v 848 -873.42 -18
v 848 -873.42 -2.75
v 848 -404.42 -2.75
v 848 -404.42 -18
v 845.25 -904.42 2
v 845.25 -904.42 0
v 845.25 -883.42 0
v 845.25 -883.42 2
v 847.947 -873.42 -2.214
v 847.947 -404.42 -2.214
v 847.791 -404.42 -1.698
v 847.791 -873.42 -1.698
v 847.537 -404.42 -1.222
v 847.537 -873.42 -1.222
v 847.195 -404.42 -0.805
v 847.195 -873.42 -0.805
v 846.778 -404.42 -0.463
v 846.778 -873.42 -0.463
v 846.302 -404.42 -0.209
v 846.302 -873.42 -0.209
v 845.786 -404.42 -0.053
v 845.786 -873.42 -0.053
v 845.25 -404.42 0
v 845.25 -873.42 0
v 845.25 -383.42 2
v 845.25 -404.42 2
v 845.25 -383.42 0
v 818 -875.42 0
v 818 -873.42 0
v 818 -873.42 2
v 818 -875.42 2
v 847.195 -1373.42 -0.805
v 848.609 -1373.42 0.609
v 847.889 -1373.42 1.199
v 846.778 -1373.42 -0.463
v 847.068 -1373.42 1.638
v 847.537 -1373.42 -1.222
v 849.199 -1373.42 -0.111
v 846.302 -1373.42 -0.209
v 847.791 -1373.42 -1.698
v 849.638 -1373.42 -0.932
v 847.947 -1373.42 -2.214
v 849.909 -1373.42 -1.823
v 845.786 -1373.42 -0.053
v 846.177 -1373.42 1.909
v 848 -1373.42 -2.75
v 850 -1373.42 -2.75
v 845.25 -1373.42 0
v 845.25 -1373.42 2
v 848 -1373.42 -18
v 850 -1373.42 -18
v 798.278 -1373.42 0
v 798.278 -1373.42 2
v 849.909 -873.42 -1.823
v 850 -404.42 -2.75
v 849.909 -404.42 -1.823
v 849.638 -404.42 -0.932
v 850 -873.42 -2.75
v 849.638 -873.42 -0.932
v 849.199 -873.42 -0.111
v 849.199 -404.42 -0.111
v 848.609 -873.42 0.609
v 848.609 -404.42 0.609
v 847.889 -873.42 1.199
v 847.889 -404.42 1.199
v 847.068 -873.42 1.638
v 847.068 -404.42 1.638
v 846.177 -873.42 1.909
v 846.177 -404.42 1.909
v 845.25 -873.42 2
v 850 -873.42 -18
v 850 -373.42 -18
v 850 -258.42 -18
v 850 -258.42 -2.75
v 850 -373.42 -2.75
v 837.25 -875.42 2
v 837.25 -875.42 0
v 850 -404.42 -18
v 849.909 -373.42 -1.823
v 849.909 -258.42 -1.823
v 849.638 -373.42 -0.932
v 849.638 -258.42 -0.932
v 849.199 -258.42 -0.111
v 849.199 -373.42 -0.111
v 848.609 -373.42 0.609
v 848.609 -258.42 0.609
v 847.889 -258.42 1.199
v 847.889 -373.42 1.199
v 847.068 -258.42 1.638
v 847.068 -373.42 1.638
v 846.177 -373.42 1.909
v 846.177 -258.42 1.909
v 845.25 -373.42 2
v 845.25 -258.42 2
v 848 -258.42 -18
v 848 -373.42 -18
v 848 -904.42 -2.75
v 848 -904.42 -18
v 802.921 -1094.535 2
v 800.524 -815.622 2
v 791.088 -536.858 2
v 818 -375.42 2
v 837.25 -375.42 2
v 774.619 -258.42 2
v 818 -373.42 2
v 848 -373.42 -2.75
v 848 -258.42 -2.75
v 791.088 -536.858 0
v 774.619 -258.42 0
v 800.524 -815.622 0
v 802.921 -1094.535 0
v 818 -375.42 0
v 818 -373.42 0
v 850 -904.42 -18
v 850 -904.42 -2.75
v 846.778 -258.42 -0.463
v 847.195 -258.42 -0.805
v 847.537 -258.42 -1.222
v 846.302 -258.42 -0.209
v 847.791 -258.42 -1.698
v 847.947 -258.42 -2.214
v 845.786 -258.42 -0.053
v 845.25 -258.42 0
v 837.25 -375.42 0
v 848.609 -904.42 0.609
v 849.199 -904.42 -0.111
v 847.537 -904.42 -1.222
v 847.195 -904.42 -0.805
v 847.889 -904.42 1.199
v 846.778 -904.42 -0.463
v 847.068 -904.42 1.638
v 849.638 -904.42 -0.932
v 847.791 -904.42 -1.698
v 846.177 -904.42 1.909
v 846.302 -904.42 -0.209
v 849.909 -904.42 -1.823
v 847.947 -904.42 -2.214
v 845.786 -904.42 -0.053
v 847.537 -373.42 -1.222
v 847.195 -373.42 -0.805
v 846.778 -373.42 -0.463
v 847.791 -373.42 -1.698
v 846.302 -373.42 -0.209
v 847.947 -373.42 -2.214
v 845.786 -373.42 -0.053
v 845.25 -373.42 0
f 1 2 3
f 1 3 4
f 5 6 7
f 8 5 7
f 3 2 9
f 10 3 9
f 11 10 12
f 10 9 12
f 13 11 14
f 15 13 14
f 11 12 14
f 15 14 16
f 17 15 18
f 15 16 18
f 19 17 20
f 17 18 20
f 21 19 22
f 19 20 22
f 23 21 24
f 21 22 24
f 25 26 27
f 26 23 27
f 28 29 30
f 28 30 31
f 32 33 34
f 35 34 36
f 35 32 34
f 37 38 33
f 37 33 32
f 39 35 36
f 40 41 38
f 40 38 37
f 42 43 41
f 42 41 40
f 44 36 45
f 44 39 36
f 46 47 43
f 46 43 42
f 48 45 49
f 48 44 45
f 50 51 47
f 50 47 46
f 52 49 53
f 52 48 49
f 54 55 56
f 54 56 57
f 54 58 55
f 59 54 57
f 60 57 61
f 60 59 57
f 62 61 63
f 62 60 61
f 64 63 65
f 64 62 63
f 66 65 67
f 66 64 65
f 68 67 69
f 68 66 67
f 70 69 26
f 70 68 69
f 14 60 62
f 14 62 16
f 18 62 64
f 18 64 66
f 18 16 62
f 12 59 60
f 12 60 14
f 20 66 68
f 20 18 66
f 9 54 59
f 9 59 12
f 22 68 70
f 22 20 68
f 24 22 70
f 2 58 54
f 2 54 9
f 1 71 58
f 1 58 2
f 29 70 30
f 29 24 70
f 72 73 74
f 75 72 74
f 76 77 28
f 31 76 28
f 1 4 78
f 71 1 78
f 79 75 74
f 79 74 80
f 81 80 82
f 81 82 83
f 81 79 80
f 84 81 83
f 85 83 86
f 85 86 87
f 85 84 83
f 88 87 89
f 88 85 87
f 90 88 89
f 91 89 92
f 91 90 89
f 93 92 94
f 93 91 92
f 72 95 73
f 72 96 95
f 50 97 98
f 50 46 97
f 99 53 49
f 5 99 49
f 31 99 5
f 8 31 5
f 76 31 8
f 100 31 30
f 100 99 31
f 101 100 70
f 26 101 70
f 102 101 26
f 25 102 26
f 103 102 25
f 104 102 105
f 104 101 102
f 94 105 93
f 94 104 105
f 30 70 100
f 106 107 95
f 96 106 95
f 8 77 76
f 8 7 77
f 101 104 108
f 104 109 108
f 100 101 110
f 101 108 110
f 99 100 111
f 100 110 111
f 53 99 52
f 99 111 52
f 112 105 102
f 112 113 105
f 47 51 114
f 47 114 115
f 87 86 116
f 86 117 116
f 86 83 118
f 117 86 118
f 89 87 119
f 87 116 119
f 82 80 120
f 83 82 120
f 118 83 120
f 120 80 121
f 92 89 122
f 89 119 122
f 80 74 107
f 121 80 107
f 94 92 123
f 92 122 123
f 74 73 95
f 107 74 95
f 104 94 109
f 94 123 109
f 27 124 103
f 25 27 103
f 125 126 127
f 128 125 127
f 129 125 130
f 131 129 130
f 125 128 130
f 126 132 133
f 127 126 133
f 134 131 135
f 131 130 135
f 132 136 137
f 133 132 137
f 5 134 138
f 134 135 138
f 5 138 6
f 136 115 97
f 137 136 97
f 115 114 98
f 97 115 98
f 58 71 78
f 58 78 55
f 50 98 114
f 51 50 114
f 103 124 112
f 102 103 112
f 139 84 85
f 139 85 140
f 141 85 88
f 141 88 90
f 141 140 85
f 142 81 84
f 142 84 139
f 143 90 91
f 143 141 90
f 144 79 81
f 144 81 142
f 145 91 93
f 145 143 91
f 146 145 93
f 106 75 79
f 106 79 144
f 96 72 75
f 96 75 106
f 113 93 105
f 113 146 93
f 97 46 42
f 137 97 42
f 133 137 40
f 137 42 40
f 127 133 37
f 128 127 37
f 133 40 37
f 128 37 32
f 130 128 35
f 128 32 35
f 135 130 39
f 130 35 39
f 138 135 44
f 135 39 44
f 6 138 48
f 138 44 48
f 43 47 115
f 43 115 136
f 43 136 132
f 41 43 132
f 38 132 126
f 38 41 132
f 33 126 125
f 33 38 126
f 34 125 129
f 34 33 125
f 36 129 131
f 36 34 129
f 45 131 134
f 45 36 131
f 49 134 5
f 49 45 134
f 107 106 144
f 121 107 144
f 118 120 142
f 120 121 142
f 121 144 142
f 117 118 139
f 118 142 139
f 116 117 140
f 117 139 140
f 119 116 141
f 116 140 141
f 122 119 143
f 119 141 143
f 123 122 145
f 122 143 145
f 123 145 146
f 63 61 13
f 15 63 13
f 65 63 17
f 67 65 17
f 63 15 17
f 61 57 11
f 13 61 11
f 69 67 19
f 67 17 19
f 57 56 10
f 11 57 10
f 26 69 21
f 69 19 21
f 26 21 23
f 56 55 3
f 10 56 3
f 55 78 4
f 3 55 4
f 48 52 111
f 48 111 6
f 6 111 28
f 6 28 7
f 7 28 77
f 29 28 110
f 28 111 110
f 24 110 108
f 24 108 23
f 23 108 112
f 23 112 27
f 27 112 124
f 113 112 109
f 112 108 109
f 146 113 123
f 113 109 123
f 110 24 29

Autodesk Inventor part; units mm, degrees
ref_plane "YZ Plane" through (0, 0, 0) normal (1, 0, 0) x (0, 1, 0)
ref_plane "XZ Plane" through (0, 0, 0) normal (0, 1, 0) x (-1, 0, 0)
ref_plane "XY Plane" through (0, 0, 0) normal (0, 0, 1) x (1, 0, 0)
sketch "Sketch1" plane through (0, 0, 0) normal (0, 0, 1) x (1, 0, 0)
  arc A0 (750, -2100) -> (770.156, -238.4205) centre (-10250, -1050) ccw construction
  arc A1 (752.9864, -2100.2851) -> (771.2831, -213.263) centre (-10246.9891, -1050.0292) ccw
  line L0 (-750, -2700) -> (-750, 0) construction
  line L1 (-800, 50) -> (-800, -2750) construction
  line L2 (-850, -2800) -> (-850, 100) construction
  line L3 (850, 100) -> (850, -2800)
  line L4 (800, -2750) -> (800, 50) construction
  line L5 (750, 0) -> (750, -2700) construction
  line L6 (770.156, -238.4205) -> (767.1641, -238.6409) construction
  line L7 (768.2917, -213.4901) -> (771.2831, -213.263) construction
  arc A2 (747.4657, -5.0326) -> (744.8748, -2.3426) centre (744.4792, -5.3164) ccw construction
  arc A3 (747.4657, -5.0326) -> (747.0136, -0.2851) centre (-10252.9895, -1050.2527) ccw construction
  arc A4 (767.1641, -238.6409) -> (747.4657, -5.0326) centre (-10252.9895, -1050.2527) ccw construction
  line L8 (750, 0) -> (747.0136, -0.2851) construction
  arc A5 (750.4522, -4.7486) -> (750, 0) centre (-10250, -1050) ccw construction
  arc A6 (750.4522, -4.7486) -> (745.2706, 0.6314) centre (744.4791, -5.3162) ccw
  line L9 (-750, 0) -> (750, 0) construction
  line L10 (-850, 100) -> (850, 100) construction
  line L11 (800, 50) -> (-800, 50) construction
  arc A7 (770.156, -238.4205) -> (750.4522, -4.7486) centre (-10250, -1050) ccw
  line L12 (750, -2700) -> (-750, -2700) construction
  line L13 (750, -2100) -> (752.9864, -2100.2851) construction
  line L14 (-800, -2750) -> (800, -2750)
  line L15 (850, -2800) -> (-850, -2800) construction
  arc A8 (110, -2700) -> (114.1118, -2698.3696) centre (110, -2694) ccw construction
  line L16 (0, -2697) -> (110, -2697) construction
  line L17 (0, -2700) -> (0, -2697) construction
  arc A9 (750, 0) -> (745.2706, 0.6314) centre (0, -5600) ccw construction
  line L18 (750, 0) -> (749.6018, -2.9735) construction
  arc A10 (750, -3.0268) -> (0, 47) centre (-0.2, -5603) ccw construction
  line L19 (0, 47) -> (0, 0) construction
  line L20 (0, 50) -> (0, 47) construction
  line L21 (0, 100) -> (0, 50)
  arc A11 (745.2706, 0.6314) -> (0, 50) centre (0, -5600) ccw construction
  line L22 (-750, -2100) -> (750, -2100) construction
  arc A12 (110, -2697) -> (112.0559, -2696.1848) centre (110, -2694) ccw construction
  line L23 (676.3163, -2173.4556) -> (674.2605, -2171.2708) construction
  line L24 (690.4112, -2151.9536) -> (692.4671, -2154.1384) construction
  line L25 (752.0559, -2102.1848) -> (676.3163, -2173.4556) construction
  line L26 (114.1118, -2698.3696) -> (750, -2100) construction
  arc A13 (752.0559, -2102.1848) -> (752.9864, -2100.2851) centre (749.9998, -2099.9999) ccw construction
  line L27 (750, -2100) -> (752.0559, -2102.1848) construction
  arc A14 (749.1768, -2100.7746) -> (750.1074, -2098.8746) centre (747.1209, -2098.5898) ccw construction
  line L28 (112.0559, -2696.1848) -> (690.4112, -2151.9536) construction
  line L29 (850, -258.4205) -> (774.6194, -258.4205)
  arc A15 (800, 50) -> (0, 100) centre (0, -6325) ccw construction
  arc A16 (824.6194, -258.4205) -> (800, 50) centre (-10711.2413, -1024.069) ccw construction
  line L30 (824.6194, -258.4205) -> (824.6194, 100) construction
  arc A17 (789.8132, -2131.1922) -> (824.6194, -258.4205) centre (-10201.1223, -990.2118) ccw construction
  line L31 (0, -2700) -> (0, -2750) construction
  line L32 (112.3791, -2700) -> (132.2053, -2750) construction
  line L33 (132.2053, -2750) -> (850, -2074.5565)
  arc A18 (770.0996, -238.4247) -> (766.3709, -188.564) centre (768.2917, -213.4901) ccw construction
  line L34 (850, -400) -> (783.8749, -400) construction
  line L35 (850, -900) -> (801.9923, -900) construction
  line L36 (850, -1400) -> (797.4674, -1400) construction
  line L37 (850, -1900) -> (770.2723, -1900) construction
  line L38 (350, 100) -> (350, 39.1489)
  line L39 (-1472.612, -150) -> (-973.4947, -150)
  line L40 (-1472.612, -700) -> (-973.4947, -700)
  line L41 (-1472.612, -1250) -> (-973.4947, -1250)
  line L42 (-1472.612, -1800) -> (-973.4947, -1800)
  line L43 (800, -2750) -> (850, -2750) construction
  line L44 (753.1643, -2098.4205) -> (850, -2098.4205)
  point P0 (824.6397, -2098.4205)
  dimension "d16" = 1500
  dimension "d17" = 2700
  dimension "d18" = 2100
  dimension "d19" = 6
  dimension "d20" = 3
  dimension "d21" = 3
  dimension "d22" = 6
  dimension "d23" = 3
  dimension "d24" = 239.271
  dimension "d25" = 50
  dimension "d26" = 50
  dimension "d27" = 3
  dimension "d28" = 110
  dimension "d29" = 25
  dimension "d30" = 104
  dimension "d31" = 25
  dimension "d32" = 20
  dimension "d33" = 50
  dimension "d57" = 500
  dimension "d58" = 500
  dimension "d59" = 500
  dimension "d60" = 500
  dimension "d61" = 500
  dimension "d83" = 250
  dimension "d86" = 550
  dimension "d91" = 274.5565
  dimension "d103" = 1.873
  dimension "d116" = 1840
extrude "Plate3" add sketch "Sketch1" along normal blind 2 contours A1 L29 L3 L33 L44
sketch "Sketch3" plane through (848, -258.4205, 2) normal (1, 0, 0) x (0, 1, 0)
  line L0 (-1816.136, 0) -> (0, 0)
  line L1 (0, 0) -> (0, 20)
  line L2 (0, 20) -> (-1816.136, 20)
  line L3 (-1816.136, 20) -> (-1816.136, 0)
edge flange "Flange2" height 20 angle 90 thickness 2 bend radius 2.75 thickness toward (1, 0, 0) relief tear relief width 2 relief depth 1 edges at (850, -1166.4885, 2) wall of the first edge with corners at (848, -2074.5565, 2) (848, -258.4205, 2) (848, -258.4205, -18) (848, -2074.5565, -18)
bend "Bend2"
corner "Corner2"
sketch "Sketch5" plane through (0, 0, 0) normal (0, 0, 1) x (1, 0, 0)
  line L0 (845.25, -2079.0263) -> (845.25, -258.4205) projected
  line L1 (774.6194, -258.4205) -> (845.25, -258.4205) projected
  arc A0 (753.1643, -2098.4205) -> (774.6194, -258.4205) centre (-10246.9891, -1050.0292) ccw projected
  line L2 (850, -258.4205) -> (850, -2074.5565) projected
  line L3 (850, -373.4205) -> (818, -373.4205)
  line L4 (850, -375.4205) -> (848, -375.4205) construction
  line L5 (848, -2074.5565) -> (848, -258.4205) projected
  line L6 (818, -373.4205) -> (818, -375.4205)
  line L7 (850, -873.4195) -> (801.5994, -873.4195) construction
  line L8 (850, -875.4195) -> (801.6312, -875.4195) construction
  line L9 (819, -873.4195) -> (819, -875.4195) construction
  line L10 (850, -1373.4195) -> (798.2777, -1373.4195) construction
  line L11 (850, -1375.4195) -> (798.2189, -1375.4195) construction
  line L12 (819, -1373.4195) -> (819, -1375.4195) construction
  line L13 (850, -1873.4195) -> (772.2907, -1873.4195) construction
  line L14 (850, -1875.4195) -> (772.1411, -1875.4195) construction
  line L15 (819, -1873.4195) -> (819, -1875.4195) construction
  line L16 (850, -904.4195) -> (845.25, -904.4195) construction
  line L17 (845.25, -1404.4195) -> (850, -1404.4195) construction
  line L18 (845.25, -1904.4195) -> (850, -1904.4195) construction
  line L19 (824.6397, -2098.4205) -> (753.1643, -2098.4205) projected
  line L20 (850, -373.4205) -> (850, -404.4205)
  line L21 (848, -373.4205) -> (848, -375.4205) construction
  line L22 (850, -404.4205) -> (848, -404.4205)
  line L23 (818, -373.4205) -> (782.2765, -373.4205) construction
  line L24 (818, -375.4205) -> (782.399, -375.4205) construction
  line L25 (848, -375.4205) -> (848, -404.4205)
  line L26 (848, -375.4205) -> (818, -375.4205)
  line L27 (848, -404.4205) -> (845.25, -404.4205)
  line L28 (845.25, -2079.0263) -> (824.6397, -2098.4205) projected
  point P0 (0, 0)
  point P1 (845.25, -380.4205)
  point P2 (848, -380.4205)
  point P3 (848, -1904.4195)
  point P4 (848, -1875.4195)
  point P5 (848, -1404.4195)
  point P6 (848, -1375.4195)
  point P7 (848, -904.4195)
  point P8 (848, -875.4195)
  point P9 (818, -374.4205)
  point P10 (848, -404.4205)
  point P11 (850, -410.4205)
  point P12 (848, -373.4205)
  point P13 (819, -874.4195)
  point P14 (819, -1374.4195)
  point P15 (819, -1874.4195)
  point P16 (848, -404.4205)
  point P17 (845.25, -375.4205)
  dimension "d69" = 1816.136
  dimension "d70" = 2
  dimension "d76" = 67.7235
  dimension "d80" = 48.4006
  dimension "d81" = 31
  dimension "d94" = 31
  dimension "d95" = 31
  dimension "d96" = 31
  dimension "d97" = 31
  dimension "d98" = 31
  dimension "d102" = 77.7093
  dimension "d104" = 51.7223
  dimension "d106" = 2
  dimension "d107" = 31
  dimension "d108" = 116
  dimension "d109" = 500
  dimension "d110" = 500
  dimension "d111" = 500
  dimension "d112" = 32
extrude "Extrusion2" cut sketch "Sketch5" along normal through all both and the other way through all contours L0 L26 L5 L27 | L26 L6 L3 L0 | L0 L3 L5 L26 | L5 L3 L2 L22
chamfer "Chamfer2" distance 8 angle 45 1 edges at (845.25, -375.4205, 1)
pattern_linear "Rectangular Pattern3" count 4 spacing 500 along (0, -1, 0) of "Extrusion2", "Chamfer2"
sketch "Sketch6" plane through (0, 0, 0) normal (0, 0, -1) x (-1, 0, 0)
  line L0 (-803.1643, -2093.4205) -> (-815.1643, -2093.4205) construction
  line L1 (-815.1643, -2093.4205) -> (-815.1643, -1893.4205) construction
  line L2 (-815.1643, -1893.4205) -> (-803.1643, -1893.4205) construction
  line L3 (-803.1643, -1893.4205) -> (-803.1643, -2093.4205) construction
  line L4 (-753.1643, -2098.4205) -> (-824.6397, -2098.4205) projected
  line L5 (-803.1643, -1798.4205) -> (-803.1643, -1848.4205) construction
  line L6 (-803.1643, -1848.4205) -> (-815.1643, -1848.4205) construction
  line L7 (-815.1643, -1848.4205) -> (-815.1643, -1798.4205) construction
  line L8 (-815.1643, -1798.4205) -> (-803.1643, -1798.4205) construction
  line L9 (-845.25, -1873.4205) -> (-818, -1873.4205) projected
  line L10 (-803.1643, -1298.4205) -> (-803.1643, -1348.4205) construction
  line L11 (-803.1643, -1348.4205) -> (-815.1643, -1348.4205) construction
  line L12 (-815.1643, -1348.4205) -> (-815.1643, -1298.4205) construction
  line L13 (-815.1643, -1298.4205) -> (-803.1643, -1298.4205) construction
  line L14 (-803.1643, -798.4205) -> (-803.1643, -848.4205) construction
  line L15 (-803.1643, -848.4205) -> (-815.1643, -848.4205) construction
  line L16 (-815.1643, -848.4205) -> (-815.1643, -798.4205) construction
  line L17 (-815.1643, -798.4205) -> (-803.1643, -798.4205) construction
  line L18 (-803.1643, -298.4205) -> (-803.1643, -348.4205) construction
  line L19 (-803.1643, -348.4205) -> (-815.1643, -348.4205) construction
  line L20 (-815.1643, -348.4205) -> (-815.1643, -298.4205) construction
  line L21 (-815.1643, -298.4205) -> (-803.1643, -298.4205) construction
  line L22 (-845.25, -1373.4205) -> (-818, -1373.4205) projected
  line L23 (-845.25, -873.4205) -> (-818, -873.4205) projected
  line L24 (-845.25, -373.4205) -> (-818, -373.4205) projected
  point P0 (0, 0)
  dimension "d120" = 200
  dimension "d121" = 12
  dimension "d123" = 5
  dimension "d124" = 50
  dimension "d125" = 12
  dimension "d126" = 50
  dimension "d127" = 25
  dimension "d128" = 50
  dimension "d129" = 12
  dimension "d130" = 50
  dimension "d131" = 12
  dimension "d132" = 50
  dimension "d133" = 12
  dimension "d134" = 50
  dimension "d135" = 25
  dimension "d136" = 25
  dimension "d137" = 25
  dimension "d138" = 50
  dimension "d139" = 50
  dimension "d140" = 50
mark "Mark1"
sketch "Sketch7" plane through (0, 0, 0) normal (0, 0, 1) x (1, 0, 0)
  line L0 (837.25, -1875.4205) -> (845.25, -1883.4205) construction
  line L1 (837.25, -1875.4205) -> (818, -1875.4205) construction
  line L2 (818, -1875.4205) -> (818, -1873.4205) construction
  line L3 (818, -1873.4205) -> (845.25, -1873.4205) construction
  line L4 (845.25, -1873.4205) -> (845.25, -1404.4205) construction
  line L5 (845.25, -1404.4205) -> (845.25, -1383.4205) construction
  line L6 (837.25, -1375.4205) -> (845.25, -1383.4205) construction
  line L7 (837.25, -1375.4205) -> (818, -1375.4205) construction
  line L8 (818, -1375.4205) -> (818, -1373.4205) construction
  line L9 (818, -1373.4205) -> (845.25, -1373.4205) construction
  line L10 (845.25, -1373.4205) -> (845.25, -904.4205) construction
  line L11 (845.25, -904.4205) -> (845.25, -883.4205) construction
  line L12 (837.25, -875.4205) -> (845.25, -883.4205) construction
  line L13 (837.25, -875.4205) -> (818, -875.4205) construction
  line L14 (818, -875.4205) -> (818, -873.4205) construction
  line L15 (818, -873.4205) -> (845.25, -873.4205) construction
  line L16 (845.25, -873.4205) -> (845.25, -404.4205) construction
  line L17 (845.25, -404.4205) -> (845.25, -383.4205) projected
  line L18 (837.25, -375.4205) -> (845.25, -383.4205) projected
  line L19 (837.25, -375.4205) -> (818, -375.4205) projected
  line L20 (818, -375.4205) -> (818, -373.4205) projected
  line L21 (818, -373.4205) -> (845.25, -373.4205) projected
  line L22 (845.25, -373.4205) -> (845.25, -258.4205) projected
  line L23 (774.6194, -258.4205) -> (845.25, -258.4205) projected
  arc A0 (753.1643, -2098.4205) -> (774.6194, -258.4205) centre (-10246.9891, -1050.0292) ccw construction
  line L24 (824.6397, -2098.4205) -> (753.1643, -2098.4205) construction
  line L25 (845.25, -2079.0263) -> (824.6397, -2098.4205) construction
  line L26 (845.25, -2079.0263) -> (845.25, -1904.4205) construction
  line L27 (845.25, -1904.4205) -> (845.25, -1883.4205) construction
  line L28 (716.6808, -2129.5736) -> (990.5996, -2129.5736)
  line L29 (990.5996, -2129.5736) -> (990.5996, -1373.4205)
  line L30 (990.5996, -1373.4205) -> (716.6808, -1373.4205)
  line L31 (716.6808, -1373.4205) -> (716.6808, -2129.5736)
  point P0 (0, 0)
extrude "Extrusion3" cut sketch "Sketch7" along normal through all both and the other way through all
equation "\"d16\" = d34"
equation "\"d17\" = d35"
equation "\"d18\" = d36"
equation "\"d19\" = d37"
equation "\"d20\" = d38"
equation "\"d21\" = d39"
equation "\"d22\" = d39 + d43"
equation "\"d23\" = d39"
equation "\"d24\" = d40"
equation "\"d27\" = d39"
equation "\"d28\" = 0.5 * d44"
equation "\"d29\" = d41"
equation "\"d30\" = d42"
equation "\"d31\" = d41"
equation "\"d33\" = d25"
equation "\"Стрингер_3\" = 67.5235"
equation "\"d37\" = d39 + d43"
equation "\"d38\" = d39"
equation "\"d43\" = d39"
equation "\"Стрингер_4\" = 48.20059"
equation "\"Стрингер_5\" = 51.52235"
equation "\"Стрингер_6\" = 77.5093"
equation "\"d34\" = 1500"
equation "\"d35\" = 2700"
equation "\"d36\" = 2100"
equation "\"d39\" = 3"
equation "\"d40\" = 239.271"
equation "\"d44\" = 220"
equation "\"d41\" = 25"
equation "\"d42\" = 104"
properties part number "MSC 052 rib board_CPY" material "Stainless Steel"
